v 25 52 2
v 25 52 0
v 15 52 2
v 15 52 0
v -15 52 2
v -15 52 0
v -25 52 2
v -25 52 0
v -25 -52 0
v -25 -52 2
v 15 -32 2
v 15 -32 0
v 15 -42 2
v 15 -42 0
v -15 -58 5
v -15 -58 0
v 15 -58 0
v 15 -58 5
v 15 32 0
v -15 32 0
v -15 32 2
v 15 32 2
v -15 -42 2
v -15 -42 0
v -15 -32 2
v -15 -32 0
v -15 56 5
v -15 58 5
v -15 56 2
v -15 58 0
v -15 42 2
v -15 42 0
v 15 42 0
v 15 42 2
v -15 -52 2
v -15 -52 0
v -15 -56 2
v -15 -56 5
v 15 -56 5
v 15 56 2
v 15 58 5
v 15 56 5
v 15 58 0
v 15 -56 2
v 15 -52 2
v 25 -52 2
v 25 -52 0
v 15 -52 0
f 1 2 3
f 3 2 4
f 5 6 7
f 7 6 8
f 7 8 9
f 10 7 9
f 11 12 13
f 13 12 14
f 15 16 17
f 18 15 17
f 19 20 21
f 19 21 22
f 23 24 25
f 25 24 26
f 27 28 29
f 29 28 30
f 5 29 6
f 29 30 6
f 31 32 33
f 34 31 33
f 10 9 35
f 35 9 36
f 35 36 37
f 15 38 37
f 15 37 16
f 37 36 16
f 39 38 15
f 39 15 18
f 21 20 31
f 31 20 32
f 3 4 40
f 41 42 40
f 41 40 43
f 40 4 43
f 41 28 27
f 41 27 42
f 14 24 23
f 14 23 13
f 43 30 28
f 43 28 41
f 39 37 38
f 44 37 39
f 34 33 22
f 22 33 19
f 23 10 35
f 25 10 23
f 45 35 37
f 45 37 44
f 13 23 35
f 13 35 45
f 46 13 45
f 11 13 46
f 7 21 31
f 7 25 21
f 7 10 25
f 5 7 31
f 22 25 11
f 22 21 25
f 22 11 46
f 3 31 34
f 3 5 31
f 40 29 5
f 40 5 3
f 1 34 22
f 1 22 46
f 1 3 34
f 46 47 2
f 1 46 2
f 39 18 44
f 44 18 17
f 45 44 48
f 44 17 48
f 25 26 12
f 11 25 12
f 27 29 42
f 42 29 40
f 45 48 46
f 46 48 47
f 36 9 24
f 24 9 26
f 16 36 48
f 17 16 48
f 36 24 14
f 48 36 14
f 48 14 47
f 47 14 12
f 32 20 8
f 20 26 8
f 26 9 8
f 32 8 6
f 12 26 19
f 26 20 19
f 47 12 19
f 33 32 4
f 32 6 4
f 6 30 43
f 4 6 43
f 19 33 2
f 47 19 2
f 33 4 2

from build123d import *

# Parameters (mm, degrees)
F0_W     = 30
F0_H     = 10
F0_H_2   = 4
F0_H_3   = 2
F1_DEPTH = 2
F2_DEPTH = 5
F0_H_4   = 64
F3_DEPTH = 2


with BuildPart() as f1:
    # F0 (on Top) → F1 (new body)
    with BuildSketch(Plane.XY):
        with Locations((0, 47)):
            Rectangle(F0_W, F0_H)
        Polygon((15, -42), (15, -52), (25, -52), (25, 52), (15, 52), (15, 42), (15, 32), (15, -32), align=None)
        with Locations((0, 54)):
            Rectangle(F0_W, F0_H_2)
        with Locations((0, 57)):
            Rectangle(F0_W, F0_H_3)
        Polygon((-25, -52), (-15, -52), (-15, -42), (-15, -32), (-15, 32), (-15, 42), (-15, 52), (-25, 52), align=None)
    extrude(amount=F1_DEPTH)

    # F0 (on Top) → F2, piece 2 (join)
    with BuildSketch(Plane.XY):
        with Locations((0, 57)):
            Rectangle(F0_W, F0_H_3)
    extrude(amount=F2_DEPTH)



with BuildPart() as f1b:
    # F0 (on Top) → F1, piece 2 (new body)
    with BuildSketch(Plane.XY):
        with Locations((0, -54)):
            Rectangle(F0_W, F0_H_2)
        with Locations((0, -57)):
            Rectangle(F0_W, F0_H_3)
    extrude(amount=F1_DEPTH)

    # F0 (on Top) → F2 (join)
    with BuildSketch(Plane.XY):
        with Locations((0, -57)):
            Rectangle(F0_W, F0_H_3)
    extrude(amount=F2_DEPTH)


with BuildPart() as f1_1:
    add(f1.part)

    add(f1b.part)  # F3 merges F1b
    # F0 (on Top) → F3 (join)
    with BuildSketch(Plane.XY):
        Rectangle(F0_W, F0_H_4)
        with Locations((0, -47)):
            Rectangle(F0_W, F0_H)
    extrude(amount=F3_DEPTH)


solid = f1_1.part
